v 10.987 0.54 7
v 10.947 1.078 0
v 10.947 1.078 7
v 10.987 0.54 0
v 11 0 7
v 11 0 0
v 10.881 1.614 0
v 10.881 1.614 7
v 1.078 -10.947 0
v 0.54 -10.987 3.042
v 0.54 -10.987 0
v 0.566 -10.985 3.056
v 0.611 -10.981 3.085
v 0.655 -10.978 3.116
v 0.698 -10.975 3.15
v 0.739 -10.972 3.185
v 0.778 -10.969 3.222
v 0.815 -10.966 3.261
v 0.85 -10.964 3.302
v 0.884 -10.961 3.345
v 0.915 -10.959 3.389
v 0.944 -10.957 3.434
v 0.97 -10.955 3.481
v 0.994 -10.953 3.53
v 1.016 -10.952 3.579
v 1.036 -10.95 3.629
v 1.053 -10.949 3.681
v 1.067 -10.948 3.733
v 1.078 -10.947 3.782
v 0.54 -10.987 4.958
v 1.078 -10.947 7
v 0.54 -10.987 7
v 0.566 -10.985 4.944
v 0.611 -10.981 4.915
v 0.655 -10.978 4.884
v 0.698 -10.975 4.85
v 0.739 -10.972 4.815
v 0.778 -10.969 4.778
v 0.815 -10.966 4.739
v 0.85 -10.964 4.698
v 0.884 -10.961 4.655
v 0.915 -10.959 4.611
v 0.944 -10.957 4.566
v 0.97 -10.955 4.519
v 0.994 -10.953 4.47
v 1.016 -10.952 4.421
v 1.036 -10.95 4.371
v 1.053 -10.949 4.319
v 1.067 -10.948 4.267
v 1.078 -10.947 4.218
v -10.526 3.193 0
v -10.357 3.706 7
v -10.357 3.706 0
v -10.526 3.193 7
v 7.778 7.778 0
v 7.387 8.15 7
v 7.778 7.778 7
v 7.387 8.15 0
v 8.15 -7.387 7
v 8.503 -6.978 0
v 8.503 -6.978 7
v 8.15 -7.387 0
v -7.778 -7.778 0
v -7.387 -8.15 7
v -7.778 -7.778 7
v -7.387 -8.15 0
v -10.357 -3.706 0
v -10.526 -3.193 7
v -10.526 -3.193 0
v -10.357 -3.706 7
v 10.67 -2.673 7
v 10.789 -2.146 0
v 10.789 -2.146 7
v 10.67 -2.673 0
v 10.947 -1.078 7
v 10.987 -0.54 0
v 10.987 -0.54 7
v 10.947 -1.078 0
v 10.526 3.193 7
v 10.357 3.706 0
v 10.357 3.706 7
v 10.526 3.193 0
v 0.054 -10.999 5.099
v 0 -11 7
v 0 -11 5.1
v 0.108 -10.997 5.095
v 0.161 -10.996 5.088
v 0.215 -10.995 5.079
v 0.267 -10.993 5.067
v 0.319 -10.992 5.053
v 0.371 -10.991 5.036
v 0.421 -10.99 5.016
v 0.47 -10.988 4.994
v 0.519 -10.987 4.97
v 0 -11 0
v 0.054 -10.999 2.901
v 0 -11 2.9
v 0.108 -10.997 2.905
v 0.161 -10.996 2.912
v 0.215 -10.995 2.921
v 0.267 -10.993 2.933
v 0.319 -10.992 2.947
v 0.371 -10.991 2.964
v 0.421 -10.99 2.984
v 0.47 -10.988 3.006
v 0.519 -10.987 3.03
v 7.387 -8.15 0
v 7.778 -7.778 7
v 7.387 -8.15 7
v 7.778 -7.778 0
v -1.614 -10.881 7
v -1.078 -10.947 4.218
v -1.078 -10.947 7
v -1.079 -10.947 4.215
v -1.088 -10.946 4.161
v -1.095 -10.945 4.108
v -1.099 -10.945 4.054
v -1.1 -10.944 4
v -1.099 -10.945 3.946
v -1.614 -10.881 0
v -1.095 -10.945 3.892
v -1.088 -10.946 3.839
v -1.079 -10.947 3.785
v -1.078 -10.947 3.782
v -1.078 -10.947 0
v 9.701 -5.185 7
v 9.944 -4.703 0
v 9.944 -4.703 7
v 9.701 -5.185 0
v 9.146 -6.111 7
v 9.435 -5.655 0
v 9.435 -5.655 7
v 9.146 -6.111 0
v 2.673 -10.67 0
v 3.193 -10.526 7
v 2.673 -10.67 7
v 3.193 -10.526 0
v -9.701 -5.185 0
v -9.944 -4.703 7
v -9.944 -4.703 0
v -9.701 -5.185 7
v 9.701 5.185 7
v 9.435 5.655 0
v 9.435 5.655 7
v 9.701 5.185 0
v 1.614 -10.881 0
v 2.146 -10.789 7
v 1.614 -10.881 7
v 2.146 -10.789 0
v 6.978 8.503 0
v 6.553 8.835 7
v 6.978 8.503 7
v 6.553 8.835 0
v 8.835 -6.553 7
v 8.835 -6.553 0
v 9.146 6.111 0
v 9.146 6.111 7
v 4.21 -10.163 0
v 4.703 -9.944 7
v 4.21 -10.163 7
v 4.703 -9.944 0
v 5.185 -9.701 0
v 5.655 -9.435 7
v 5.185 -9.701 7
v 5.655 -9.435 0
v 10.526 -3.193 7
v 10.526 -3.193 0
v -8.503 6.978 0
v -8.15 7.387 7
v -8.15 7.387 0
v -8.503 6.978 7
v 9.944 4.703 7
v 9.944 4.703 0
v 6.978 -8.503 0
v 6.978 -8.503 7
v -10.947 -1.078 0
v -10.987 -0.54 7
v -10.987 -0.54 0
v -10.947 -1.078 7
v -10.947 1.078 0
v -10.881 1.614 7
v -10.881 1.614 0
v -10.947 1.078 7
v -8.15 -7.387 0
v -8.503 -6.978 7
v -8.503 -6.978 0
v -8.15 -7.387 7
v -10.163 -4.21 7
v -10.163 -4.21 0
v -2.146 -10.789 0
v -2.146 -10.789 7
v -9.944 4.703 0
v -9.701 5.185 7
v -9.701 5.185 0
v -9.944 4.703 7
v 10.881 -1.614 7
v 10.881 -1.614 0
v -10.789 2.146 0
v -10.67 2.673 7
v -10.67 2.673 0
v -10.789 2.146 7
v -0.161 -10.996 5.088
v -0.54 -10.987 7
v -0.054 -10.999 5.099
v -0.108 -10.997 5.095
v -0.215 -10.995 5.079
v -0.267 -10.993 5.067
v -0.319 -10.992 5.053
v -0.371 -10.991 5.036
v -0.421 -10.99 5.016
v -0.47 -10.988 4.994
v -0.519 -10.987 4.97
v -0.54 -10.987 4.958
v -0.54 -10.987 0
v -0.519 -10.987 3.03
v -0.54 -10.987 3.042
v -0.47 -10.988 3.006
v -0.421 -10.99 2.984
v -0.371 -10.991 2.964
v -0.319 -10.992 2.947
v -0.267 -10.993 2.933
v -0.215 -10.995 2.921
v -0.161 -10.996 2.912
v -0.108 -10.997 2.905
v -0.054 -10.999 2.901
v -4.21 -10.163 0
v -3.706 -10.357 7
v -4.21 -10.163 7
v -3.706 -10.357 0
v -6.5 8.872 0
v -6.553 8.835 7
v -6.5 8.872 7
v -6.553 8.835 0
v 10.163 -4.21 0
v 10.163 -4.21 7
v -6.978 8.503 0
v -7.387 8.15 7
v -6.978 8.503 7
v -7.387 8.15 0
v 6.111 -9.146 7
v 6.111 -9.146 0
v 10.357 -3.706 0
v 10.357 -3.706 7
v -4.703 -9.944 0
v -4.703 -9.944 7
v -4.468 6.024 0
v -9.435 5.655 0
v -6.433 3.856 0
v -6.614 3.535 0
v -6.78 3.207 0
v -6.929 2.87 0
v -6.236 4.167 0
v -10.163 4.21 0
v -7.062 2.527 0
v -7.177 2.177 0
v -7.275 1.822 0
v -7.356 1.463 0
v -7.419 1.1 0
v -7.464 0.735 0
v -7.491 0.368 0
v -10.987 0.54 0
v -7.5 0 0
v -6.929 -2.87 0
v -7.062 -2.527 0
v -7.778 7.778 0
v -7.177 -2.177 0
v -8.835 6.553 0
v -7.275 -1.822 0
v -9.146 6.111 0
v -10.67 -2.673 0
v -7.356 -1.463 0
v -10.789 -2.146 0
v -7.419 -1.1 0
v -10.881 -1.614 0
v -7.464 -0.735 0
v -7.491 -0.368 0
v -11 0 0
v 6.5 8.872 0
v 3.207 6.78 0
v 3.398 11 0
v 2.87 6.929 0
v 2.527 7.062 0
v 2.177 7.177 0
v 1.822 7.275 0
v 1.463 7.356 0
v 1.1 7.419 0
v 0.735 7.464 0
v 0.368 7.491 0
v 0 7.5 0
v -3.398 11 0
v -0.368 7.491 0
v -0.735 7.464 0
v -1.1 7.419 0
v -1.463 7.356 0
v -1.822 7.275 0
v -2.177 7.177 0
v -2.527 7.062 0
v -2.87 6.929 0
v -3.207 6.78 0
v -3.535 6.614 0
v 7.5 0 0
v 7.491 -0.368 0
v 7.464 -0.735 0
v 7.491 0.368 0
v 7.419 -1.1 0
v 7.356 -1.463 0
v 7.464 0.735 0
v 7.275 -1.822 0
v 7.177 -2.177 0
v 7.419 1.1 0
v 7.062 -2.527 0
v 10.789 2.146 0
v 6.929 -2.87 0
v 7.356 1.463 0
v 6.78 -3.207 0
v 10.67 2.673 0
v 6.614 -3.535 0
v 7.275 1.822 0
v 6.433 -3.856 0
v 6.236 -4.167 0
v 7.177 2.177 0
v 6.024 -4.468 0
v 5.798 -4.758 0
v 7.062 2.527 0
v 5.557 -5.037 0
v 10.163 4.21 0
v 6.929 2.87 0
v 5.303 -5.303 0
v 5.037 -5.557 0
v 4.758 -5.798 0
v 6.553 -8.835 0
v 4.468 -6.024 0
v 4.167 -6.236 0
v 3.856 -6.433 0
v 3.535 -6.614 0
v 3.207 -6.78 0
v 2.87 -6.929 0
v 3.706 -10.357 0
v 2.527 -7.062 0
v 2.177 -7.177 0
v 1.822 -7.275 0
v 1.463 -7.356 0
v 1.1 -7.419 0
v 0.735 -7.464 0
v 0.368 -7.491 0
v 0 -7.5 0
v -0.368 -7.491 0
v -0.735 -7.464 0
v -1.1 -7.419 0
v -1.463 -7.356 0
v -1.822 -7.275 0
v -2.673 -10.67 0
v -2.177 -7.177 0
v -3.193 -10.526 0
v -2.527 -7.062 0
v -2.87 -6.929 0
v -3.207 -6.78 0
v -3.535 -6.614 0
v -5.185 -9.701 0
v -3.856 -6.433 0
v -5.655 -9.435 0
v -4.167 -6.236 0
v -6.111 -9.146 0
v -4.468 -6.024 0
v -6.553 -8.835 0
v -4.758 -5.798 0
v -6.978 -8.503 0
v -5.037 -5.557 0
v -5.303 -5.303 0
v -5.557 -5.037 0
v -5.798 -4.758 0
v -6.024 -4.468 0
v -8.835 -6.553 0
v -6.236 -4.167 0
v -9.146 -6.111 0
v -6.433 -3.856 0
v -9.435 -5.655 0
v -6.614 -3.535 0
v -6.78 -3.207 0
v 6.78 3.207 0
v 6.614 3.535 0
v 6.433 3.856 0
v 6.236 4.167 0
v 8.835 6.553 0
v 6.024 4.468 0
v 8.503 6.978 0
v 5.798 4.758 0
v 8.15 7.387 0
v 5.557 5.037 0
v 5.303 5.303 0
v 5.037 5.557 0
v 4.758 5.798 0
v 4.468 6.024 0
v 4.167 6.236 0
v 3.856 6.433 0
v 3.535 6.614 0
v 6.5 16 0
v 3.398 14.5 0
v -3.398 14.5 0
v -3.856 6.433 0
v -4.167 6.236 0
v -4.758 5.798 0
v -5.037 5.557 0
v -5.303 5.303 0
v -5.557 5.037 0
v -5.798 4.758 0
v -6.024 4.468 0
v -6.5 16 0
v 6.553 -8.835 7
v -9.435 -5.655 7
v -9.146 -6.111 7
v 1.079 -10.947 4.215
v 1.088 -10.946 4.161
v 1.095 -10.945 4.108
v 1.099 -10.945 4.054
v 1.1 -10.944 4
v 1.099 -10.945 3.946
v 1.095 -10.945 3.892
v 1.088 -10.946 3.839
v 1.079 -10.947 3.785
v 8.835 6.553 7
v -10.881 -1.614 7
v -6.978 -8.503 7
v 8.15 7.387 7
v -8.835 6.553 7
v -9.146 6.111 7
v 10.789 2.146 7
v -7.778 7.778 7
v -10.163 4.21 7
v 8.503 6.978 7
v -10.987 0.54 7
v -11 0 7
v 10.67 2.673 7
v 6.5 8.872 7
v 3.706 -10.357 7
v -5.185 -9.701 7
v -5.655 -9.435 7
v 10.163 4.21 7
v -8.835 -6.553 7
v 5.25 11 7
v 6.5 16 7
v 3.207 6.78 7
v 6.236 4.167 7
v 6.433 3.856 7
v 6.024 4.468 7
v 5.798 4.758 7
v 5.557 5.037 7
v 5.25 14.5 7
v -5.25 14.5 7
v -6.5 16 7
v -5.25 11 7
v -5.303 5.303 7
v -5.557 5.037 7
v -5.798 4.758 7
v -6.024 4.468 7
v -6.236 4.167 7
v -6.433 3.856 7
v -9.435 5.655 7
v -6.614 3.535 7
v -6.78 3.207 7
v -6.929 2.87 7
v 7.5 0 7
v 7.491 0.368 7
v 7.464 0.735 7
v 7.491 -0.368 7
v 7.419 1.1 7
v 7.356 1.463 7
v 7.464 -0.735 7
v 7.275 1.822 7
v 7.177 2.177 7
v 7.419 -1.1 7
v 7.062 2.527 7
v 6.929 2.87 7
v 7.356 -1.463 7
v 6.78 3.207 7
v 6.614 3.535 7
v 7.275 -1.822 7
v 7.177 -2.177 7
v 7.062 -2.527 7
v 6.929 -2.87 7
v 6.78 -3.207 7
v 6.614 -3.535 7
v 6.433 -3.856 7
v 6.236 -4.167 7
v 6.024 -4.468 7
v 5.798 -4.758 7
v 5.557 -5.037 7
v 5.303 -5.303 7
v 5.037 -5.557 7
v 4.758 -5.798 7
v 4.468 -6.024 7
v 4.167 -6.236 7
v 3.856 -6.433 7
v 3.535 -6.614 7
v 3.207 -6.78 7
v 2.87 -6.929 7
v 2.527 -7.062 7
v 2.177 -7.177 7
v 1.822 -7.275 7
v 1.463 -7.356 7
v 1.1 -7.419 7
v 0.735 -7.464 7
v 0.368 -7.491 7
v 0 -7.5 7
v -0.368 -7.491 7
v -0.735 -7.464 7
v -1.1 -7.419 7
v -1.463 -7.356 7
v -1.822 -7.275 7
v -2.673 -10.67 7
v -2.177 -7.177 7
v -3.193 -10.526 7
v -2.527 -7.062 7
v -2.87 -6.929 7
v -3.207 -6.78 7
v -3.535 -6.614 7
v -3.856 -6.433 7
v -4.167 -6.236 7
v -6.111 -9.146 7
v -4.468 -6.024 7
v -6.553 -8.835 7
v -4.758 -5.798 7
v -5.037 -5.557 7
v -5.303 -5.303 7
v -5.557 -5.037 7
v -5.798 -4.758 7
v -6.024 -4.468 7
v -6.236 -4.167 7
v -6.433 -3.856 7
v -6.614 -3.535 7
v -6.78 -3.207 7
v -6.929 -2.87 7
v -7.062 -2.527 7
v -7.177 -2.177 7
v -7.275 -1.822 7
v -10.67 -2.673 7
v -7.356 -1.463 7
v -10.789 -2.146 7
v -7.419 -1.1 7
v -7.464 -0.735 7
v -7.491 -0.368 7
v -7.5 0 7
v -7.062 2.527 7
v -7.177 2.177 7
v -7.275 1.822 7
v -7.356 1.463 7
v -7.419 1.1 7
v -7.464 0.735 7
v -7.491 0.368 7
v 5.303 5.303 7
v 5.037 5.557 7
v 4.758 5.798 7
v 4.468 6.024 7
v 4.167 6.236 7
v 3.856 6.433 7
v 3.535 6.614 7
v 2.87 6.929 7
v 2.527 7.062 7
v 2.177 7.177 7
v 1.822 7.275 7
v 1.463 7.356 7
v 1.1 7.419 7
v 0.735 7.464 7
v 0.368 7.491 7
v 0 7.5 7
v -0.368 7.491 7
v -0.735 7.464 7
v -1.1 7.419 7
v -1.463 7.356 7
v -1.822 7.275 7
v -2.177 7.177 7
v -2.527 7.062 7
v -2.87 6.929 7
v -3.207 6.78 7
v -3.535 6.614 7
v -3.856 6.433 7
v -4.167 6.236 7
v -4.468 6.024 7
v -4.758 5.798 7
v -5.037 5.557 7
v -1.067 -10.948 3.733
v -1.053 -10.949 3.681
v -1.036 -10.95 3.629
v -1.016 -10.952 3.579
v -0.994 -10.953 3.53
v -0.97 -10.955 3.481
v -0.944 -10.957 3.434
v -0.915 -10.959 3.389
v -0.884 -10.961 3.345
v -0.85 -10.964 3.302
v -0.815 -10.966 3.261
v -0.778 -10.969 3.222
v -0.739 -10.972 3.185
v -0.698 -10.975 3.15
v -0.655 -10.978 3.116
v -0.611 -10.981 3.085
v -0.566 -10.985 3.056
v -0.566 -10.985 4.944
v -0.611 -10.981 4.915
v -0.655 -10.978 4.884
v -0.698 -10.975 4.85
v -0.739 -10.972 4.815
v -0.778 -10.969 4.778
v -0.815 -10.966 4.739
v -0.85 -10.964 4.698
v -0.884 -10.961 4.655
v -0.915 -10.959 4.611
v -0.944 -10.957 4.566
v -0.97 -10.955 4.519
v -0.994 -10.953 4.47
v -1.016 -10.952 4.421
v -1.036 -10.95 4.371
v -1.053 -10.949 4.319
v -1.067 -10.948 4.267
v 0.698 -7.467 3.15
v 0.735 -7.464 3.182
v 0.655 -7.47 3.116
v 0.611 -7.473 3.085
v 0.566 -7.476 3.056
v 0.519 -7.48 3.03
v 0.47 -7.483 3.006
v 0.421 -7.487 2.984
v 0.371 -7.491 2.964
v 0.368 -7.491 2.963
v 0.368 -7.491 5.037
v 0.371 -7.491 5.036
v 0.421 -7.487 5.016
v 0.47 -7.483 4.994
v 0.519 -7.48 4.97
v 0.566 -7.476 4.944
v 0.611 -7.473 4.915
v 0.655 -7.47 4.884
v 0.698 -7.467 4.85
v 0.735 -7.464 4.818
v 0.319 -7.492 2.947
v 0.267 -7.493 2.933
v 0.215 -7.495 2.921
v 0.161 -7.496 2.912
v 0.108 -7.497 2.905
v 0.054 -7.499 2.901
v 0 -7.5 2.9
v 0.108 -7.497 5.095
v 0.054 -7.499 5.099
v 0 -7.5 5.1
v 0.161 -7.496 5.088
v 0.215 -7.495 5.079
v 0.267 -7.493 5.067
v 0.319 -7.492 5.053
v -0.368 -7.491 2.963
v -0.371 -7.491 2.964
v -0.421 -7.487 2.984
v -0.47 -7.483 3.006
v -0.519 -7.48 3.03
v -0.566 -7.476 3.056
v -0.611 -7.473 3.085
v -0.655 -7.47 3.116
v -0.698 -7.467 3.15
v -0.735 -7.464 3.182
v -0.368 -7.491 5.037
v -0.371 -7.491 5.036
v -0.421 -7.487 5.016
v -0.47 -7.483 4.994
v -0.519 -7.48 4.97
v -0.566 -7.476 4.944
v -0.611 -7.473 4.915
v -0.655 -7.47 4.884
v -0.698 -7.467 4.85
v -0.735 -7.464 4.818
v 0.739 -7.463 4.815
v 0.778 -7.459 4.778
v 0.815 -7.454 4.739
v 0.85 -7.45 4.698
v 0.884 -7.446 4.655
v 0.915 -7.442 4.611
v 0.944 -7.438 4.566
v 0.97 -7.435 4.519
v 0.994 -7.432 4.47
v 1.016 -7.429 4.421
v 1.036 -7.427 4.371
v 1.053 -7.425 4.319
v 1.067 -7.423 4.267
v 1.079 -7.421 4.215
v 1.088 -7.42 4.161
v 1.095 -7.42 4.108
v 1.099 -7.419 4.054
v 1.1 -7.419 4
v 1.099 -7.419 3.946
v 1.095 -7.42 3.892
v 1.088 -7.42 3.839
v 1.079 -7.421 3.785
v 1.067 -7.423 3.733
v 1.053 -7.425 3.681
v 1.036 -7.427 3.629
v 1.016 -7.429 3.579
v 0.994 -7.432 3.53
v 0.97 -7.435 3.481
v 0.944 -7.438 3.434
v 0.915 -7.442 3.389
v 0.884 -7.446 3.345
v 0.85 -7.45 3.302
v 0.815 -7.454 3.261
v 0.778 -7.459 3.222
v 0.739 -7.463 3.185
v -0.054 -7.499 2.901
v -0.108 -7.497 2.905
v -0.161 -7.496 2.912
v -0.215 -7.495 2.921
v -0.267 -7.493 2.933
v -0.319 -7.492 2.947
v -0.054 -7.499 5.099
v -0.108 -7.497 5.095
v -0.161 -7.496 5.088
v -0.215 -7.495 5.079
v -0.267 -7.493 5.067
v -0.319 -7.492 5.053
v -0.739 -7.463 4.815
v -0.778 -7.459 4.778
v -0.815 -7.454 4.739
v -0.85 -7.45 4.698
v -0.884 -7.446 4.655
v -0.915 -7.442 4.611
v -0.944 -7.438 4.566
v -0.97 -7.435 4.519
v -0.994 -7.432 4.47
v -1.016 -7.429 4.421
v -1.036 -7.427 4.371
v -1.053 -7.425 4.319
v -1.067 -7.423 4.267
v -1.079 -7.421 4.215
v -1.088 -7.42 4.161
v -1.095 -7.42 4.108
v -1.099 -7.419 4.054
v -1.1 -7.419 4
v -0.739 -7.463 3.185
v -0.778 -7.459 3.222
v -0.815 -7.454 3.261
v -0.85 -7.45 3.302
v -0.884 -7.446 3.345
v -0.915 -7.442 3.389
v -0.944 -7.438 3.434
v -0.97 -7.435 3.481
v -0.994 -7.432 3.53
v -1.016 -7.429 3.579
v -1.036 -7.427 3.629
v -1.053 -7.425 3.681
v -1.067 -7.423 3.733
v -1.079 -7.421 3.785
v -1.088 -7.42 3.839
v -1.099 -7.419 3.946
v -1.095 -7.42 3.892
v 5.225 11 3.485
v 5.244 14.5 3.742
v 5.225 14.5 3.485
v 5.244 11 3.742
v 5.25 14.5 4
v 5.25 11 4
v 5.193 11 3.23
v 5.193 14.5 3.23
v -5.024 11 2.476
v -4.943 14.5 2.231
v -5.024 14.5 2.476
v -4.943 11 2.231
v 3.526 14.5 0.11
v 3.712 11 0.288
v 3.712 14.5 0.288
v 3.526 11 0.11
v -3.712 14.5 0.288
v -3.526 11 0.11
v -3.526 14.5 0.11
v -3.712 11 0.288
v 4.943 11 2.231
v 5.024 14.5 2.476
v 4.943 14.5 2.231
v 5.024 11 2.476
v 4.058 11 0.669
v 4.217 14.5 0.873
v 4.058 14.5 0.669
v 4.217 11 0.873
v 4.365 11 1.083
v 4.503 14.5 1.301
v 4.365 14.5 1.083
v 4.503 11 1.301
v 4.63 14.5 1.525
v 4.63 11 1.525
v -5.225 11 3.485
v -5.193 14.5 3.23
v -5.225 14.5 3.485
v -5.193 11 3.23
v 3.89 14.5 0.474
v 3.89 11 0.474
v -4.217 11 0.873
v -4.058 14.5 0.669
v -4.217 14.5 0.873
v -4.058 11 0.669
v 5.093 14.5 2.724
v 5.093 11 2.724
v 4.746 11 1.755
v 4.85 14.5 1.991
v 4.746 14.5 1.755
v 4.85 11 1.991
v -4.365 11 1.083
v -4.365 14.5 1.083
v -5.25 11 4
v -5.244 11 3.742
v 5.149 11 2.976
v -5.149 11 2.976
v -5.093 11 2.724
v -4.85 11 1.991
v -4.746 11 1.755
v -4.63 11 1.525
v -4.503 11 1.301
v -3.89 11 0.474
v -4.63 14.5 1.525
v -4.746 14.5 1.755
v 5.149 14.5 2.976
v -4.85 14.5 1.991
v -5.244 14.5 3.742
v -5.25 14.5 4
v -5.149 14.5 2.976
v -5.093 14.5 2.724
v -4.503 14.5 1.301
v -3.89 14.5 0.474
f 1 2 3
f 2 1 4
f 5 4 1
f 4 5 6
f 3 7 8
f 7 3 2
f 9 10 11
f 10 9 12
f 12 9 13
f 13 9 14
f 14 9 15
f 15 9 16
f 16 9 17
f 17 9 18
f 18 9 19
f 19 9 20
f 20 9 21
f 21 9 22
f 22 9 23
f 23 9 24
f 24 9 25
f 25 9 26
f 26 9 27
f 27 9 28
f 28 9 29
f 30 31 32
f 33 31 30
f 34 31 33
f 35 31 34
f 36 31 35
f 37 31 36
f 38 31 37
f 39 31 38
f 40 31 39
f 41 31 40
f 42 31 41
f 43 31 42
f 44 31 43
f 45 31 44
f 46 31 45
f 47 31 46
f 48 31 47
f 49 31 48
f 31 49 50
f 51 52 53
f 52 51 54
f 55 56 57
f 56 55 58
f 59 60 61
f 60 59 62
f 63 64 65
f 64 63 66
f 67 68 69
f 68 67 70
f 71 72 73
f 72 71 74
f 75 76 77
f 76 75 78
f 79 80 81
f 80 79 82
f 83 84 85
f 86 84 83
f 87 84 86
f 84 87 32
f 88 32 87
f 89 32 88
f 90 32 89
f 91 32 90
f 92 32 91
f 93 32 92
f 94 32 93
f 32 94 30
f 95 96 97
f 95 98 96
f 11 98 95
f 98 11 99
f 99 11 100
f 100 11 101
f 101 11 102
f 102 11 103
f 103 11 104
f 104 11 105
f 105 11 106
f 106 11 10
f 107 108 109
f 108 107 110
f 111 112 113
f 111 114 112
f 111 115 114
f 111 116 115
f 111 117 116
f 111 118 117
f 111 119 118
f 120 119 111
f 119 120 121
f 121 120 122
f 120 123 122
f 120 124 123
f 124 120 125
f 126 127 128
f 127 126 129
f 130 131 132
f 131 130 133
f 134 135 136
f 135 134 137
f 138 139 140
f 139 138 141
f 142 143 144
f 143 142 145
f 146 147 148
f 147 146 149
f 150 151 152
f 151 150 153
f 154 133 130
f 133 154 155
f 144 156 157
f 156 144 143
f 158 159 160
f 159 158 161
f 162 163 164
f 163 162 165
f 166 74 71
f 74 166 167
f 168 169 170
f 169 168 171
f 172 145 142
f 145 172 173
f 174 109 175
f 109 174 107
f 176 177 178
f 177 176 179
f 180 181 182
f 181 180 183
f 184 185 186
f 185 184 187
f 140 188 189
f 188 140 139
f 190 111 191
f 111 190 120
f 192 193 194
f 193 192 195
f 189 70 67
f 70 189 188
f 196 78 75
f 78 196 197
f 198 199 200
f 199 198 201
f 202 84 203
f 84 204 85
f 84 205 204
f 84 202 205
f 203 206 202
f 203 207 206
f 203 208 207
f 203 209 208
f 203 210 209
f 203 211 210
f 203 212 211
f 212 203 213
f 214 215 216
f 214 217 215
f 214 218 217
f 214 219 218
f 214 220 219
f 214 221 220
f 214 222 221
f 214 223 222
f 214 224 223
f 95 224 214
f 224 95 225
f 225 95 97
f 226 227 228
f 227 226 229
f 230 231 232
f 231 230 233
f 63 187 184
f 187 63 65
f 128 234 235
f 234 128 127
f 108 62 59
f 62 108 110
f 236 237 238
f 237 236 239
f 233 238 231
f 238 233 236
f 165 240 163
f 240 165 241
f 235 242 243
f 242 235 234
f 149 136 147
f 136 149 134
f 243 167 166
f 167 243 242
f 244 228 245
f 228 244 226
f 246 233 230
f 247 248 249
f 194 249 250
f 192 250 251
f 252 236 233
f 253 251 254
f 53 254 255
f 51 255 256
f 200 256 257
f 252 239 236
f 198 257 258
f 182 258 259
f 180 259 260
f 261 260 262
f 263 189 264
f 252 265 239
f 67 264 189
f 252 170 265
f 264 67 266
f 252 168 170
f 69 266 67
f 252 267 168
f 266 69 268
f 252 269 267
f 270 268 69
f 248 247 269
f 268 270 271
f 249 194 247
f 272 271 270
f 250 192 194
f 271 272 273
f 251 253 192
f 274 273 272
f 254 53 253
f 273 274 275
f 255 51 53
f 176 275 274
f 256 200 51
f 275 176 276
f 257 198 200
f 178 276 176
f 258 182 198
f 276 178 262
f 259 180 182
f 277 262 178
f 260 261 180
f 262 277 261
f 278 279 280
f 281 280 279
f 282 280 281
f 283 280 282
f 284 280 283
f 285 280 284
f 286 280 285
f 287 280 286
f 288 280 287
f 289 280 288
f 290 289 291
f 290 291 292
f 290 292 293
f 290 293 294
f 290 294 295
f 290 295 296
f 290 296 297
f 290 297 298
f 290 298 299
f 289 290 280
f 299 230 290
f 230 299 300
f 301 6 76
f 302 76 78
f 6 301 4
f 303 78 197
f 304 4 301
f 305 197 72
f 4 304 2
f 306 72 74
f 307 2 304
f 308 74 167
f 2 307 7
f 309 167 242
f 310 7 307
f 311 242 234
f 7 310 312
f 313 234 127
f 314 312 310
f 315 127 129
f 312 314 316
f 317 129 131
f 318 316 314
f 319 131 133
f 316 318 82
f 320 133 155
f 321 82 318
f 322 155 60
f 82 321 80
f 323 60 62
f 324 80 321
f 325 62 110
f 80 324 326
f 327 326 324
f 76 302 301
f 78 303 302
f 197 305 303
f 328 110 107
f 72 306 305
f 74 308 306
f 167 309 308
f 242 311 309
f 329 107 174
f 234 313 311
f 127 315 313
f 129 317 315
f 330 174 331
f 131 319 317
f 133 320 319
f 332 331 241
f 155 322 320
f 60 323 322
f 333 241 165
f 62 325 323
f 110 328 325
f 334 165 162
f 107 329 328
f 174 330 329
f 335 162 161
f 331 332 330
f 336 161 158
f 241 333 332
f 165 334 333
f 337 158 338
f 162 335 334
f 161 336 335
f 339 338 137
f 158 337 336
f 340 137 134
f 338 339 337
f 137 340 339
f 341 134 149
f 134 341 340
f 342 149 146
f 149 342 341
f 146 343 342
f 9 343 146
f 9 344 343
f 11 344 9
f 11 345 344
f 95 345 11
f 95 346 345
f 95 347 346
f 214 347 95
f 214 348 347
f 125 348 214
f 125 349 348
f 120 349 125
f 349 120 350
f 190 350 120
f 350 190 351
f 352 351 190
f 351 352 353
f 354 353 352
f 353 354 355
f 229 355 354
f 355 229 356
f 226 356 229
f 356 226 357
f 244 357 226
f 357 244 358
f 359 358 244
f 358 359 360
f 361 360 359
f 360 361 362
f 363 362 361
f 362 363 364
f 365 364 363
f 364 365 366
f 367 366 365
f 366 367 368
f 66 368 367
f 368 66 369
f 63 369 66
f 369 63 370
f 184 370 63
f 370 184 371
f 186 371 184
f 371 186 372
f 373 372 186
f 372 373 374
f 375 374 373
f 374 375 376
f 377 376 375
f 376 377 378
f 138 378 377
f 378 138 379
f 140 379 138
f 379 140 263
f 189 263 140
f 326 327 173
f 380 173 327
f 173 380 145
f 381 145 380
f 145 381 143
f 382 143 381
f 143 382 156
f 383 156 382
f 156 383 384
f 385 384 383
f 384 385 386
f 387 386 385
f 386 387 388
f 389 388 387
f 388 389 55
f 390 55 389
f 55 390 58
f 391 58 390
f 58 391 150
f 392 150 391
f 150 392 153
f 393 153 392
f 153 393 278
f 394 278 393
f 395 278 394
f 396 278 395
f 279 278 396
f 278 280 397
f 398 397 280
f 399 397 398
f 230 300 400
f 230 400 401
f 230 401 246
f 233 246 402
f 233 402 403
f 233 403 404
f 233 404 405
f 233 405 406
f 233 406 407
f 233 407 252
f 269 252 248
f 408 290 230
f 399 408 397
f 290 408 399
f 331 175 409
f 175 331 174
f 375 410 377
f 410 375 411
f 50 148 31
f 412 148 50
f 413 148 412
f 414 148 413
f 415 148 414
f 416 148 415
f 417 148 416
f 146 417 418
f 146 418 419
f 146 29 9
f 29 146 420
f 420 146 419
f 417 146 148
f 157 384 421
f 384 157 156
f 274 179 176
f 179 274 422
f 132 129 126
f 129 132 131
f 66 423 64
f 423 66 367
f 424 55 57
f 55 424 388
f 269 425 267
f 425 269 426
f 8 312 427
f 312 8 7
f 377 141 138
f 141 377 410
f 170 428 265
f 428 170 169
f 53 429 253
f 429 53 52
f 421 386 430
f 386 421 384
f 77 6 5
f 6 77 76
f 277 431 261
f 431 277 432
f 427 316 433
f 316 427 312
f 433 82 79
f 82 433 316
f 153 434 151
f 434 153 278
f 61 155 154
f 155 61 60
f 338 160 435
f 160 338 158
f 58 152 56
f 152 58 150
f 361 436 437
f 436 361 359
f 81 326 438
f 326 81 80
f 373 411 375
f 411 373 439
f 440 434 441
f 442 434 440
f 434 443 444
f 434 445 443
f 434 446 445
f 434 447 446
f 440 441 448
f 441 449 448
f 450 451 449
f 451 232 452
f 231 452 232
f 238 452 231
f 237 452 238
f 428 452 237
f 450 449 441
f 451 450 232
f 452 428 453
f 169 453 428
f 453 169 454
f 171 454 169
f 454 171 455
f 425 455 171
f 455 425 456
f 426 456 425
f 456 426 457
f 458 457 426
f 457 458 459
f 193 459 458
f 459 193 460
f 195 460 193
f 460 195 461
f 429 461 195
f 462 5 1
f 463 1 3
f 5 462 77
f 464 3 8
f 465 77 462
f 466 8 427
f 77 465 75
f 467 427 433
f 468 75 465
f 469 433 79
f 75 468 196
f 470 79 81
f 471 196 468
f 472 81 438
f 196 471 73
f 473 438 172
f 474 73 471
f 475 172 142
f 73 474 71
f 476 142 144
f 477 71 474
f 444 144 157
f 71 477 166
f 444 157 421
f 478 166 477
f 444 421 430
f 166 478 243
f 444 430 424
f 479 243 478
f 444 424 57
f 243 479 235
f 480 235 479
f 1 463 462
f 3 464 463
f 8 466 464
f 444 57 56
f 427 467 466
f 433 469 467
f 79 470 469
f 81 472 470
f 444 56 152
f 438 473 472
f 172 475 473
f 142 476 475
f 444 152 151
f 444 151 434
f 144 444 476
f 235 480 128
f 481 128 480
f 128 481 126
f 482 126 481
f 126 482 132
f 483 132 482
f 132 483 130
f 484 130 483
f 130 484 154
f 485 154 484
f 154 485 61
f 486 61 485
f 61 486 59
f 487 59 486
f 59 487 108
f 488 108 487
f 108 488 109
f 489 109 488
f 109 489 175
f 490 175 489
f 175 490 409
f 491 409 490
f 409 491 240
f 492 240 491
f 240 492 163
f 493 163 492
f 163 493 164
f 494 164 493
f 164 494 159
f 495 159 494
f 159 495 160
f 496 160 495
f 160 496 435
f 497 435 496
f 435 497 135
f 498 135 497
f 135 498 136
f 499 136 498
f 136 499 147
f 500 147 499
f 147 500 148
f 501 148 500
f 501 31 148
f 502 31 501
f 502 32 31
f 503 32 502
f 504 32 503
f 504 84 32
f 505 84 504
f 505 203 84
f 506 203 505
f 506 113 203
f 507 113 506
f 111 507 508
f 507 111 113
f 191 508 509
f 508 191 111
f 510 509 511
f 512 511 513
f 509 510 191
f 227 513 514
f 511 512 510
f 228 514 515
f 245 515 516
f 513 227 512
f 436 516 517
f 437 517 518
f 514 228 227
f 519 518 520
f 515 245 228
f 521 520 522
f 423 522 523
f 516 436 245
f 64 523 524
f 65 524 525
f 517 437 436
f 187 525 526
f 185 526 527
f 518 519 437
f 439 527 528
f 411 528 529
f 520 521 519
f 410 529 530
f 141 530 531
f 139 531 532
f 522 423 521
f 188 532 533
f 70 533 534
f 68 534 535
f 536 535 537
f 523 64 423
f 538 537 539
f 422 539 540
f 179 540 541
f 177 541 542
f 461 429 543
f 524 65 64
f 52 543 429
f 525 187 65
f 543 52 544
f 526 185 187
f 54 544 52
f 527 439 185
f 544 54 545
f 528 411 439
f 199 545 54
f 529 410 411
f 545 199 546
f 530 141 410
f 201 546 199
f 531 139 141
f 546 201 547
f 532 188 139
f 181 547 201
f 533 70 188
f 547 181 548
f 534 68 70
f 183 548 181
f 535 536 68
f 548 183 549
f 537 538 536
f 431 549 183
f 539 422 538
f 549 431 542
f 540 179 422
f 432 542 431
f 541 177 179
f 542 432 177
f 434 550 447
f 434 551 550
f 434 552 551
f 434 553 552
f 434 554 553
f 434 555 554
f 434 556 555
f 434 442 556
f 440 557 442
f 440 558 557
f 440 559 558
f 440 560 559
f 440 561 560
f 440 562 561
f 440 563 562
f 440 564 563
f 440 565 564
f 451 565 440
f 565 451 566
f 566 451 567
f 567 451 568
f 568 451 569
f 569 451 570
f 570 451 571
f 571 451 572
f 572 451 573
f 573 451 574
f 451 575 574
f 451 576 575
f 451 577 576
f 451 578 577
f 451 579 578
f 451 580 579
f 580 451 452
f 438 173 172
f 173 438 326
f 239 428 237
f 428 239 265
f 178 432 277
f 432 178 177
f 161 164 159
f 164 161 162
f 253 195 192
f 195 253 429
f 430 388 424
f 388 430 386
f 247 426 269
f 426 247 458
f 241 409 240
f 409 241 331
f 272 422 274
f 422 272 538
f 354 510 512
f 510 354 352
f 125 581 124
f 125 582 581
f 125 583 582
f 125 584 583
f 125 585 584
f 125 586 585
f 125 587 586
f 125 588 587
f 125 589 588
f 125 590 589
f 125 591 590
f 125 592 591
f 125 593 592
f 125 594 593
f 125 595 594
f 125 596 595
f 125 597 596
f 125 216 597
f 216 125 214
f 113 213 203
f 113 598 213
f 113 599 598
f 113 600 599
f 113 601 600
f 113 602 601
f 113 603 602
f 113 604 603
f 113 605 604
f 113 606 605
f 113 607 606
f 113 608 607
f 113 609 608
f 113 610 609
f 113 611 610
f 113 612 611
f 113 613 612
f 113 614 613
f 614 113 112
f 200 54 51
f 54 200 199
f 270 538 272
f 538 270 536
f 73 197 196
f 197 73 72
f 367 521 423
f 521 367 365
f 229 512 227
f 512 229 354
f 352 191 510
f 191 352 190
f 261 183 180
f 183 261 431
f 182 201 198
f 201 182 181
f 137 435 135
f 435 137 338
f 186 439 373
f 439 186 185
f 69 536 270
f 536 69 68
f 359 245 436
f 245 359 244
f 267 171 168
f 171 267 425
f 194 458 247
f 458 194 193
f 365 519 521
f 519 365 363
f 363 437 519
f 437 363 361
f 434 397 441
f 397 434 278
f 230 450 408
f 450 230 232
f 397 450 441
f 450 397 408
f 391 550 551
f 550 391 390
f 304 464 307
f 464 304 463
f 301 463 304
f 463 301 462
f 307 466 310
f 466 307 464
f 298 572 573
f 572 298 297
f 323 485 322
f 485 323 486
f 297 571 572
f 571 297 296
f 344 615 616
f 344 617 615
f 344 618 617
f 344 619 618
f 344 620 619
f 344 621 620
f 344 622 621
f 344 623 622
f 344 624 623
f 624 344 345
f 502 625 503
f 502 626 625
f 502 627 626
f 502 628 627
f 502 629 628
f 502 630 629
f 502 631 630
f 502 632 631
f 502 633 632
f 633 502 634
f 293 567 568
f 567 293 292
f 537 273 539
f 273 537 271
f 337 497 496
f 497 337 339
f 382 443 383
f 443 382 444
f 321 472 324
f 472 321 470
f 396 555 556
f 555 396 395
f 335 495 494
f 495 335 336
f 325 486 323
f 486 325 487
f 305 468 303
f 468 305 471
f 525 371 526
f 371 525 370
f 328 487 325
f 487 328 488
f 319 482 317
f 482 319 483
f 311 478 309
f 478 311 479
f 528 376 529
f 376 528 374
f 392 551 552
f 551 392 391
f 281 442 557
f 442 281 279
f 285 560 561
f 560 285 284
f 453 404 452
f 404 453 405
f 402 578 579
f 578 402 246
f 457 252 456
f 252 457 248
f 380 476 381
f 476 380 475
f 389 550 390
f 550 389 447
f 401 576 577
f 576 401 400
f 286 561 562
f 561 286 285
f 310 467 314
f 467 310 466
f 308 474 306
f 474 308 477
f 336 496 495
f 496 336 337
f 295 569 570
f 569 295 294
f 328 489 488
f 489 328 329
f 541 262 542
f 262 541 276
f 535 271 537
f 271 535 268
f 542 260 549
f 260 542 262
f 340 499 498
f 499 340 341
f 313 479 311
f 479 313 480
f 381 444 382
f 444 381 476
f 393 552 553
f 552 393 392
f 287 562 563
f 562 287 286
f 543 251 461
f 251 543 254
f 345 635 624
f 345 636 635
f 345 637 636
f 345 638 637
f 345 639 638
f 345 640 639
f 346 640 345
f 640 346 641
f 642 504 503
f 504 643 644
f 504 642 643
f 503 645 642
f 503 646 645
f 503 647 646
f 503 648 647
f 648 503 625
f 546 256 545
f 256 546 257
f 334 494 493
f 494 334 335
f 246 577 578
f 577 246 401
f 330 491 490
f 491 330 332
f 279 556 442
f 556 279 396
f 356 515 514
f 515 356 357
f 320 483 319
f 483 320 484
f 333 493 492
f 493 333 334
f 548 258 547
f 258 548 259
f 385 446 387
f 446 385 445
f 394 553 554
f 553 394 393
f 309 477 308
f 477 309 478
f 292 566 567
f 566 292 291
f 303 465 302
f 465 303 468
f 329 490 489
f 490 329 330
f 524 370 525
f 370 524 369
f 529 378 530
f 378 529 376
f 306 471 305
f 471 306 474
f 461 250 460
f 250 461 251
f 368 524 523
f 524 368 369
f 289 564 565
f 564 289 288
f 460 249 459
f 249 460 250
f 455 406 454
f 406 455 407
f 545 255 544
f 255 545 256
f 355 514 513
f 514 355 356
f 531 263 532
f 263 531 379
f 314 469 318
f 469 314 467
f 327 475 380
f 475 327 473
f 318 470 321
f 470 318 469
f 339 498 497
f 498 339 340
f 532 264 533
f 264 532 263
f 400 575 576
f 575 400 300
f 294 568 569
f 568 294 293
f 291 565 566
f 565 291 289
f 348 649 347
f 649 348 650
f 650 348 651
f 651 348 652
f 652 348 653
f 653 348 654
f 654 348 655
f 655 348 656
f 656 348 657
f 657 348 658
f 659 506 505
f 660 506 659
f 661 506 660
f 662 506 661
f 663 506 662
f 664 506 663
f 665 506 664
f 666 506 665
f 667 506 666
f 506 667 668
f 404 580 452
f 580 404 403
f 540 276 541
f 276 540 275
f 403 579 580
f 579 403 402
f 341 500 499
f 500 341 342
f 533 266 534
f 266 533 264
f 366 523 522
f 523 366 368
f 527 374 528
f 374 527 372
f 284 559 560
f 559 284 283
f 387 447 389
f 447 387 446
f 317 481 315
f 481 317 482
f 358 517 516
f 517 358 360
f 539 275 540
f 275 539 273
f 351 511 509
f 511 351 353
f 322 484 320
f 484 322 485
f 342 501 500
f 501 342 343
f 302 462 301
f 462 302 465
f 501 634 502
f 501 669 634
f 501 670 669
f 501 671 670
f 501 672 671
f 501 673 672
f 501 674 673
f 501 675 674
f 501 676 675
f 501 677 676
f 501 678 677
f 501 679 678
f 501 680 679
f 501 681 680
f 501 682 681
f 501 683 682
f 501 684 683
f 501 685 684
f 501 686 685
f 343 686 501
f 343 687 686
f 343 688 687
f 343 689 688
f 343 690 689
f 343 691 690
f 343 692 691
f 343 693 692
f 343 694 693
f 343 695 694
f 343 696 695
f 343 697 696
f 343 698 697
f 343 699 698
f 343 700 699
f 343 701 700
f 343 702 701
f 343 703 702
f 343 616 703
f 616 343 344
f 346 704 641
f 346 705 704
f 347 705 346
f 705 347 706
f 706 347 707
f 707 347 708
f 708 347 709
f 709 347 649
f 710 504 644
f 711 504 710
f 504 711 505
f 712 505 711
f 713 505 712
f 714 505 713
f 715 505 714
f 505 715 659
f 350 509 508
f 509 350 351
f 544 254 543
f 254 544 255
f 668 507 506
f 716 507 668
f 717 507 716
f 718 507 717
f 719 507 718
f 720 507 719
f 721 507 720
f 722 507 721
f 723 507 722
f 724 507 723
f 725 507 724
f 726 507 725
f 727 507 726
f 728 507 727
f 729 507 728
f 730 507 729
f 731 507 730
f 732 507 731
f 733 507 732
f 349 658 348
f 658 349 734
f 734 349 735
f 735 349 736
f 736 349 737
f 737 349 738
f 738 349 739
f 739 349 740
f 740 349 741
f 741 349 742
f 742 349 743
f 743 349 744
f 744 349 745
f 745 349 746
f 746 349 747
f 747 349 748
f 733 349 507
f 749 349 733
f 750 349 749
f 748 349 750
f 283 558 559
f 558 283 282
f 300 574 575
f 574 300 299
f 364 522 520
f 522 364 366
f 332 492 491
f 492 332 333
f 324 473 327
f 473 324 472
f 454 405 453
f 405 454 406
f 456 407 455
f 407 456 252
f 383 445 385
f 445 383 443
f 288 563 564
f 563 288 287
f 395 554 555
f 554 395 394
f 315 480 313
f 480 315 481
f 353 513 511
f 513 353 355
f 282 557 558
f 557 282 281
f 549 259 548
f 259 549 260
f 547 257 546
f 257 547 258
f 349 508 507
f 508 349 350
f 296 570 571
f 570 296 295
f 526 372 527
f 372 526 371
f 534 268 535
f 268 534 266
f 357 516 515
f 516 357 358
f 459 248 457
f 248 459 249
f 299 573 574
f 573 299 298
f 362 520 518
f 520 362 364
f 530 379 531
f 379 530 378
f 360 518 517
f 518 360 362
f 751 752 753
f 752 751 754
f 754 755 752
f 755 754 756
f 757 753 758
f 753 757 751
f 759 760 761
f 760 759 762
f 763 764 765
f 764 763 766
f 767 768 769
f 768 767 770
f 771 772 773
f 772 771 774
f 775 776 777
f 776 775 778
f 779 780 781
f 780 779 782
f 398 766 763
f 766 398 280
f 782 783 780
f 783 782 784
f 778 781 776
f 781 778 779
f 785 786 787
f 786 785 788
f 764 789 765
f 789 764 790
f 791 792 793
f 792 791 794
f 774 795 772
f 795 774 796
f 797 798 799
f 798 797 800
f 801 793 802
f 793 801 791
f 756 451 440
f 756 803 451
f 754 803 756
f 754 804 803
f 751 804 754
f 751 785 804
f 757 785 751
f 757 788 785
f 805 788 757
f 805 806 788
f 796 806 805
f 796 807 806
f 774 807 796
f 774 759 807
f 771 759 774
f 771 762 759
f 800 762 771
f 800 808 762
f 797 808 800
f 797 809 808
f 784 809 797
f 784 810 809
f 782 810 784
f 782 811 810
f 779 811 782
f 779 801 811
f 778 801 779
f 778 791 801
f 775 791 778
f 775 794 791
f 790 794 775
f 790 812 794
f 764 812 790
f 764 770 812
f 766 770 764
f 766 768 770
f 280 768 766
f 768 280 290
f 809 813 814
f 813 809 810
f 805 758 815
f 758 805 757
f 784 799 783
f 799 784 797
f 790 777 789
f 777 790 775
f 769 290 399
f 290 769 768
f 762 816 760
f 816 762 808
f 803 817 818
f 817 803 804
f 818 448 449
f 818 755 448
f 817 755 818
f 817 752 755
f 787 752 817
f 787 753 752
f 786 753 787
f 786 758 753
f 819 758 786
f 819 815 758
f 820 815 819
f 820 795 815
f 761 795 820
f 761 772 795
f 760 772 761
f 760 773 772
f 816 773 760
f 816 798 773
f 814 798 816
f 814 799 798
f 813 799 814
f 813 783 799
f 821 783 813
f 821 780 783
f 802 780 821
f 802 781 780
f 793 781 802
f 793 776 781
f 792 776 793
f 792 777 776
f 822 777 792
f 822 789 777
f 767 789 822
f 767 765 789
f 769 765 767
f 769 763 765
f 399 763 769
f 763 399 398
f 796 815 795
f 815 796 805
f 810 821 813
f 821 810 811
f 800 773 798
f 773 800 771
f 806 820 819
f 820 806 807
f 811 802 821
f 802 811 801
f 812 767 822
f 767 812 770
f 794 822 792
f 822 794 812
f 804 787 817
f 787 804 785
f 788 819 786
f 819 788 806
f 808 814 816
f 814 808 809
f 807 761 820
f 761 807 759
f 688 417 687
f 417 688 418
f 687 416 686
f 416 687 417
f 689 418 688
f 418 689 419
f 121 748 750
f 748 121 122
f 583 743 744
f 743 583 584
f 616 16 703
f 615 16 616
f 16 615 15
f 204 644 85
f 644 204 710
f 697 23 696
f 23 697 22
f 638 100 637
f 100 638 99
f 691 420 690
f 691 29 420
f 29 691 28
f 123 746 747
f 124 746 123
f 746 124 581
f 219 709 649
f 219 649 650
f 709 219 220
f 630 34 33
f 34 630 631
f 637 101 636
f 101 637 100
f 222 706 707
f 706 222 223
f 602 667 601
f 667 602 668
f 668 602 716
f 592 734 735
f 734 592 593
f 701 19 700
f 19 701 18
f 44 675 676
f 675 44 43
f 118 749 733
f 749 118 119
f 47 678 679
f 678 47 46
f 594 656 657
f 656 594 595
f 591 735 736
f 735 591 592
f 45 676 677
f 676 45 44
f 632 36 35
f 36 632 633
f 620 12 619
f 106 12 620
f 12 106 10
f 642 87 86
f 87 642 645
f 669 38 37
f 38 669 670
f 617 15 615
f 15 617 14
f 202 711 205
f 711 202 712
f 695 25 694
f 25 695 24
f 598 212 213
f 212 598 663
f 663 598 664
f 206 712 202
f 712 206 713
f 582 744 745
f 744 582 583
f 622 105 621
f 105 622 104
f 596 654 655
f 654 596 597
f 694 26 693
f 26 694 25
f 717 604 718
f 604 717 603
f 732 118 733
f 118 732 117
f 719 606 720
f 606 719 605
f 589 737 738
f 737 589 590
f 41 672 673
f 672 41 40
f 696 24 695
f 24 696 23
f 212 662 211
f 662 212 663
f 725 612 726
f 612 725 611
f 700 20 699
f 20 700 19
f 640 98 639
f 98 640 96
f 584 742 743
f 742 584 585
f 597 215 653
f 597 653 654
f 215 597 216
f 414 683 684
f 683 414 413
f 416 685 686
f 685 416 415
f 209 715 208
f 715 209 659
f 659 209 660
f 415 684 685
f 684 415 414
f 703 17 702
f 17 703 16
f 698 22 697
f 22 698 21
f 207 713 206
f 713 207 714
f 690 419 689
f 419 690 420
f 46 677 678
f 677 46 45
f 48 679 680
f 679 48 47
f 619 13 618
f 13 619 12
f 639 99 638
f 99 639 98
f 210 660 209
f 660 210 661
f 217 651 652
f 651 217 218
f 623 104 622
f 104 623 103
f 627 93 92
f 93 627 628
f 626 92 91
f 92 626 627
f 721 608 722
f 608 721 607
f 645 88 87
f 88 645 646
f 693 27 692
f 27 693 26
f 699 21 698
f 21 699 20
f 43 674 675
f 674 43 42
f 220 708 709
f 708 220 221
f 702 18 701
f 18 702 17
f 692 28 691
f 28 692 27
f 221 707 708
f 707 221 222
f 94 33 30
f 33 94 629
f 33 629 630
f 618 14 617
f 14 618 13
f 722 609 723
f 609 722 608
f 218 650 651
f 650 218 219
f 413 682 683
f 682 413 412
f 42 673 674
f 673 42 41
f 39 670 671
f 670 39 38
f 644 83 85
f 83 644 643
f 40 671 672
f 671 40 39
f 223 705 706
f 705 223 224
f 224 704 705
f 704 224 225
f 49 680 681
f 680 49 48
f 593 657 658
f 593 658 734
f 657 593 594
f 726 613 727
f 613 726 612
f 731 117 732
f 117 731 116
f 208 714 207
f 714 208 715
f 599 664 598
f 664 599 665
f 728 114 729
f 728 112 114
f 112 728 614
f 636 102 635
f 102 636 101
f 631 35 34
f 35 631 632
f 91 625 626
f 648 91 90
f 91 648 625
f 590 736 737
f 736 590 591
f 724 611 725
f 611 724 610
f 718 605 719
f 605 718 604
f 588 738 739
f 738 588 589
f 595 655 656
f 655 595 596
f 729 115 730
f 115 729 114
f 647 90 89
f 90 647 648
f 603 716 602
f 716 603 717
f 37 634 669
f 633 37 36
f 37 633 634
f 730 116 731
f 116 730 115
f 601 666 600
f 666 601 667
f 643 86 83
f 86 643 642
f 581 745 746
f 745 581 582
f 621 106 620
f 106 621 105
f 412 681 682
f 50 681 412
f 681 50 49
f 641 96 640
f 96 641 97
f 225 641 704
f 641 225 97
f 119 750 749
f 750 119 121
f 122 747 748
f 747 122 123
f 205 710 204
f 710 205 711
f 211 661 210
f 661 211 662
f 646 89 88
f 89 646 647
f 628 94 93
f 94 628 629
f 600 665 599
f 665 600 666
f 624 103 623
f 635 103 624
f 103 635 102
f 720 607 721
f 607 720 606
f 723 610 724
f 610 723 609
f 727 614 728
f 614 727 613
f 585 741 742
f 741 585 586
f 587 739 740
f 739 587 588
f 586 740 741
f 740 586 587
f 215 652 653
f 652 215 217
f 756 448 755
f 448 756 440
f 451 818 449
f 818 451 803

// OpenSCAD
//  14.2875 (9/16) Spindle
// 10 mm magnet (3mm thick)
// 12 mm sensor

magHolderDia = 22;
magHolder();


module magHolder(){
    difference(){
        union(){
        cylinder(d=magHolderDia, h=7, $fn=128);
        translate([-13/2,magHolderDia/2 - 5,0])
        cube([13,10,7]);
        }
        translate([0,0,-.1])
        cylinder(d=15, h=11, $fn=128);


translate([0,magHolderDia/2,4])
rotate([-90,0,0])
cylinder(d=10.5, h=3.5, $fn=128);

translate([0,-magHolderDia/2-1,4])
rotate([-90,0,0])
cylinder(d=2.2, h=15, $fn=128);



translate([-5.25,magHolderDia/2,4])
        cube([10.5,3.5,10]);

        
    }
    
    
}
